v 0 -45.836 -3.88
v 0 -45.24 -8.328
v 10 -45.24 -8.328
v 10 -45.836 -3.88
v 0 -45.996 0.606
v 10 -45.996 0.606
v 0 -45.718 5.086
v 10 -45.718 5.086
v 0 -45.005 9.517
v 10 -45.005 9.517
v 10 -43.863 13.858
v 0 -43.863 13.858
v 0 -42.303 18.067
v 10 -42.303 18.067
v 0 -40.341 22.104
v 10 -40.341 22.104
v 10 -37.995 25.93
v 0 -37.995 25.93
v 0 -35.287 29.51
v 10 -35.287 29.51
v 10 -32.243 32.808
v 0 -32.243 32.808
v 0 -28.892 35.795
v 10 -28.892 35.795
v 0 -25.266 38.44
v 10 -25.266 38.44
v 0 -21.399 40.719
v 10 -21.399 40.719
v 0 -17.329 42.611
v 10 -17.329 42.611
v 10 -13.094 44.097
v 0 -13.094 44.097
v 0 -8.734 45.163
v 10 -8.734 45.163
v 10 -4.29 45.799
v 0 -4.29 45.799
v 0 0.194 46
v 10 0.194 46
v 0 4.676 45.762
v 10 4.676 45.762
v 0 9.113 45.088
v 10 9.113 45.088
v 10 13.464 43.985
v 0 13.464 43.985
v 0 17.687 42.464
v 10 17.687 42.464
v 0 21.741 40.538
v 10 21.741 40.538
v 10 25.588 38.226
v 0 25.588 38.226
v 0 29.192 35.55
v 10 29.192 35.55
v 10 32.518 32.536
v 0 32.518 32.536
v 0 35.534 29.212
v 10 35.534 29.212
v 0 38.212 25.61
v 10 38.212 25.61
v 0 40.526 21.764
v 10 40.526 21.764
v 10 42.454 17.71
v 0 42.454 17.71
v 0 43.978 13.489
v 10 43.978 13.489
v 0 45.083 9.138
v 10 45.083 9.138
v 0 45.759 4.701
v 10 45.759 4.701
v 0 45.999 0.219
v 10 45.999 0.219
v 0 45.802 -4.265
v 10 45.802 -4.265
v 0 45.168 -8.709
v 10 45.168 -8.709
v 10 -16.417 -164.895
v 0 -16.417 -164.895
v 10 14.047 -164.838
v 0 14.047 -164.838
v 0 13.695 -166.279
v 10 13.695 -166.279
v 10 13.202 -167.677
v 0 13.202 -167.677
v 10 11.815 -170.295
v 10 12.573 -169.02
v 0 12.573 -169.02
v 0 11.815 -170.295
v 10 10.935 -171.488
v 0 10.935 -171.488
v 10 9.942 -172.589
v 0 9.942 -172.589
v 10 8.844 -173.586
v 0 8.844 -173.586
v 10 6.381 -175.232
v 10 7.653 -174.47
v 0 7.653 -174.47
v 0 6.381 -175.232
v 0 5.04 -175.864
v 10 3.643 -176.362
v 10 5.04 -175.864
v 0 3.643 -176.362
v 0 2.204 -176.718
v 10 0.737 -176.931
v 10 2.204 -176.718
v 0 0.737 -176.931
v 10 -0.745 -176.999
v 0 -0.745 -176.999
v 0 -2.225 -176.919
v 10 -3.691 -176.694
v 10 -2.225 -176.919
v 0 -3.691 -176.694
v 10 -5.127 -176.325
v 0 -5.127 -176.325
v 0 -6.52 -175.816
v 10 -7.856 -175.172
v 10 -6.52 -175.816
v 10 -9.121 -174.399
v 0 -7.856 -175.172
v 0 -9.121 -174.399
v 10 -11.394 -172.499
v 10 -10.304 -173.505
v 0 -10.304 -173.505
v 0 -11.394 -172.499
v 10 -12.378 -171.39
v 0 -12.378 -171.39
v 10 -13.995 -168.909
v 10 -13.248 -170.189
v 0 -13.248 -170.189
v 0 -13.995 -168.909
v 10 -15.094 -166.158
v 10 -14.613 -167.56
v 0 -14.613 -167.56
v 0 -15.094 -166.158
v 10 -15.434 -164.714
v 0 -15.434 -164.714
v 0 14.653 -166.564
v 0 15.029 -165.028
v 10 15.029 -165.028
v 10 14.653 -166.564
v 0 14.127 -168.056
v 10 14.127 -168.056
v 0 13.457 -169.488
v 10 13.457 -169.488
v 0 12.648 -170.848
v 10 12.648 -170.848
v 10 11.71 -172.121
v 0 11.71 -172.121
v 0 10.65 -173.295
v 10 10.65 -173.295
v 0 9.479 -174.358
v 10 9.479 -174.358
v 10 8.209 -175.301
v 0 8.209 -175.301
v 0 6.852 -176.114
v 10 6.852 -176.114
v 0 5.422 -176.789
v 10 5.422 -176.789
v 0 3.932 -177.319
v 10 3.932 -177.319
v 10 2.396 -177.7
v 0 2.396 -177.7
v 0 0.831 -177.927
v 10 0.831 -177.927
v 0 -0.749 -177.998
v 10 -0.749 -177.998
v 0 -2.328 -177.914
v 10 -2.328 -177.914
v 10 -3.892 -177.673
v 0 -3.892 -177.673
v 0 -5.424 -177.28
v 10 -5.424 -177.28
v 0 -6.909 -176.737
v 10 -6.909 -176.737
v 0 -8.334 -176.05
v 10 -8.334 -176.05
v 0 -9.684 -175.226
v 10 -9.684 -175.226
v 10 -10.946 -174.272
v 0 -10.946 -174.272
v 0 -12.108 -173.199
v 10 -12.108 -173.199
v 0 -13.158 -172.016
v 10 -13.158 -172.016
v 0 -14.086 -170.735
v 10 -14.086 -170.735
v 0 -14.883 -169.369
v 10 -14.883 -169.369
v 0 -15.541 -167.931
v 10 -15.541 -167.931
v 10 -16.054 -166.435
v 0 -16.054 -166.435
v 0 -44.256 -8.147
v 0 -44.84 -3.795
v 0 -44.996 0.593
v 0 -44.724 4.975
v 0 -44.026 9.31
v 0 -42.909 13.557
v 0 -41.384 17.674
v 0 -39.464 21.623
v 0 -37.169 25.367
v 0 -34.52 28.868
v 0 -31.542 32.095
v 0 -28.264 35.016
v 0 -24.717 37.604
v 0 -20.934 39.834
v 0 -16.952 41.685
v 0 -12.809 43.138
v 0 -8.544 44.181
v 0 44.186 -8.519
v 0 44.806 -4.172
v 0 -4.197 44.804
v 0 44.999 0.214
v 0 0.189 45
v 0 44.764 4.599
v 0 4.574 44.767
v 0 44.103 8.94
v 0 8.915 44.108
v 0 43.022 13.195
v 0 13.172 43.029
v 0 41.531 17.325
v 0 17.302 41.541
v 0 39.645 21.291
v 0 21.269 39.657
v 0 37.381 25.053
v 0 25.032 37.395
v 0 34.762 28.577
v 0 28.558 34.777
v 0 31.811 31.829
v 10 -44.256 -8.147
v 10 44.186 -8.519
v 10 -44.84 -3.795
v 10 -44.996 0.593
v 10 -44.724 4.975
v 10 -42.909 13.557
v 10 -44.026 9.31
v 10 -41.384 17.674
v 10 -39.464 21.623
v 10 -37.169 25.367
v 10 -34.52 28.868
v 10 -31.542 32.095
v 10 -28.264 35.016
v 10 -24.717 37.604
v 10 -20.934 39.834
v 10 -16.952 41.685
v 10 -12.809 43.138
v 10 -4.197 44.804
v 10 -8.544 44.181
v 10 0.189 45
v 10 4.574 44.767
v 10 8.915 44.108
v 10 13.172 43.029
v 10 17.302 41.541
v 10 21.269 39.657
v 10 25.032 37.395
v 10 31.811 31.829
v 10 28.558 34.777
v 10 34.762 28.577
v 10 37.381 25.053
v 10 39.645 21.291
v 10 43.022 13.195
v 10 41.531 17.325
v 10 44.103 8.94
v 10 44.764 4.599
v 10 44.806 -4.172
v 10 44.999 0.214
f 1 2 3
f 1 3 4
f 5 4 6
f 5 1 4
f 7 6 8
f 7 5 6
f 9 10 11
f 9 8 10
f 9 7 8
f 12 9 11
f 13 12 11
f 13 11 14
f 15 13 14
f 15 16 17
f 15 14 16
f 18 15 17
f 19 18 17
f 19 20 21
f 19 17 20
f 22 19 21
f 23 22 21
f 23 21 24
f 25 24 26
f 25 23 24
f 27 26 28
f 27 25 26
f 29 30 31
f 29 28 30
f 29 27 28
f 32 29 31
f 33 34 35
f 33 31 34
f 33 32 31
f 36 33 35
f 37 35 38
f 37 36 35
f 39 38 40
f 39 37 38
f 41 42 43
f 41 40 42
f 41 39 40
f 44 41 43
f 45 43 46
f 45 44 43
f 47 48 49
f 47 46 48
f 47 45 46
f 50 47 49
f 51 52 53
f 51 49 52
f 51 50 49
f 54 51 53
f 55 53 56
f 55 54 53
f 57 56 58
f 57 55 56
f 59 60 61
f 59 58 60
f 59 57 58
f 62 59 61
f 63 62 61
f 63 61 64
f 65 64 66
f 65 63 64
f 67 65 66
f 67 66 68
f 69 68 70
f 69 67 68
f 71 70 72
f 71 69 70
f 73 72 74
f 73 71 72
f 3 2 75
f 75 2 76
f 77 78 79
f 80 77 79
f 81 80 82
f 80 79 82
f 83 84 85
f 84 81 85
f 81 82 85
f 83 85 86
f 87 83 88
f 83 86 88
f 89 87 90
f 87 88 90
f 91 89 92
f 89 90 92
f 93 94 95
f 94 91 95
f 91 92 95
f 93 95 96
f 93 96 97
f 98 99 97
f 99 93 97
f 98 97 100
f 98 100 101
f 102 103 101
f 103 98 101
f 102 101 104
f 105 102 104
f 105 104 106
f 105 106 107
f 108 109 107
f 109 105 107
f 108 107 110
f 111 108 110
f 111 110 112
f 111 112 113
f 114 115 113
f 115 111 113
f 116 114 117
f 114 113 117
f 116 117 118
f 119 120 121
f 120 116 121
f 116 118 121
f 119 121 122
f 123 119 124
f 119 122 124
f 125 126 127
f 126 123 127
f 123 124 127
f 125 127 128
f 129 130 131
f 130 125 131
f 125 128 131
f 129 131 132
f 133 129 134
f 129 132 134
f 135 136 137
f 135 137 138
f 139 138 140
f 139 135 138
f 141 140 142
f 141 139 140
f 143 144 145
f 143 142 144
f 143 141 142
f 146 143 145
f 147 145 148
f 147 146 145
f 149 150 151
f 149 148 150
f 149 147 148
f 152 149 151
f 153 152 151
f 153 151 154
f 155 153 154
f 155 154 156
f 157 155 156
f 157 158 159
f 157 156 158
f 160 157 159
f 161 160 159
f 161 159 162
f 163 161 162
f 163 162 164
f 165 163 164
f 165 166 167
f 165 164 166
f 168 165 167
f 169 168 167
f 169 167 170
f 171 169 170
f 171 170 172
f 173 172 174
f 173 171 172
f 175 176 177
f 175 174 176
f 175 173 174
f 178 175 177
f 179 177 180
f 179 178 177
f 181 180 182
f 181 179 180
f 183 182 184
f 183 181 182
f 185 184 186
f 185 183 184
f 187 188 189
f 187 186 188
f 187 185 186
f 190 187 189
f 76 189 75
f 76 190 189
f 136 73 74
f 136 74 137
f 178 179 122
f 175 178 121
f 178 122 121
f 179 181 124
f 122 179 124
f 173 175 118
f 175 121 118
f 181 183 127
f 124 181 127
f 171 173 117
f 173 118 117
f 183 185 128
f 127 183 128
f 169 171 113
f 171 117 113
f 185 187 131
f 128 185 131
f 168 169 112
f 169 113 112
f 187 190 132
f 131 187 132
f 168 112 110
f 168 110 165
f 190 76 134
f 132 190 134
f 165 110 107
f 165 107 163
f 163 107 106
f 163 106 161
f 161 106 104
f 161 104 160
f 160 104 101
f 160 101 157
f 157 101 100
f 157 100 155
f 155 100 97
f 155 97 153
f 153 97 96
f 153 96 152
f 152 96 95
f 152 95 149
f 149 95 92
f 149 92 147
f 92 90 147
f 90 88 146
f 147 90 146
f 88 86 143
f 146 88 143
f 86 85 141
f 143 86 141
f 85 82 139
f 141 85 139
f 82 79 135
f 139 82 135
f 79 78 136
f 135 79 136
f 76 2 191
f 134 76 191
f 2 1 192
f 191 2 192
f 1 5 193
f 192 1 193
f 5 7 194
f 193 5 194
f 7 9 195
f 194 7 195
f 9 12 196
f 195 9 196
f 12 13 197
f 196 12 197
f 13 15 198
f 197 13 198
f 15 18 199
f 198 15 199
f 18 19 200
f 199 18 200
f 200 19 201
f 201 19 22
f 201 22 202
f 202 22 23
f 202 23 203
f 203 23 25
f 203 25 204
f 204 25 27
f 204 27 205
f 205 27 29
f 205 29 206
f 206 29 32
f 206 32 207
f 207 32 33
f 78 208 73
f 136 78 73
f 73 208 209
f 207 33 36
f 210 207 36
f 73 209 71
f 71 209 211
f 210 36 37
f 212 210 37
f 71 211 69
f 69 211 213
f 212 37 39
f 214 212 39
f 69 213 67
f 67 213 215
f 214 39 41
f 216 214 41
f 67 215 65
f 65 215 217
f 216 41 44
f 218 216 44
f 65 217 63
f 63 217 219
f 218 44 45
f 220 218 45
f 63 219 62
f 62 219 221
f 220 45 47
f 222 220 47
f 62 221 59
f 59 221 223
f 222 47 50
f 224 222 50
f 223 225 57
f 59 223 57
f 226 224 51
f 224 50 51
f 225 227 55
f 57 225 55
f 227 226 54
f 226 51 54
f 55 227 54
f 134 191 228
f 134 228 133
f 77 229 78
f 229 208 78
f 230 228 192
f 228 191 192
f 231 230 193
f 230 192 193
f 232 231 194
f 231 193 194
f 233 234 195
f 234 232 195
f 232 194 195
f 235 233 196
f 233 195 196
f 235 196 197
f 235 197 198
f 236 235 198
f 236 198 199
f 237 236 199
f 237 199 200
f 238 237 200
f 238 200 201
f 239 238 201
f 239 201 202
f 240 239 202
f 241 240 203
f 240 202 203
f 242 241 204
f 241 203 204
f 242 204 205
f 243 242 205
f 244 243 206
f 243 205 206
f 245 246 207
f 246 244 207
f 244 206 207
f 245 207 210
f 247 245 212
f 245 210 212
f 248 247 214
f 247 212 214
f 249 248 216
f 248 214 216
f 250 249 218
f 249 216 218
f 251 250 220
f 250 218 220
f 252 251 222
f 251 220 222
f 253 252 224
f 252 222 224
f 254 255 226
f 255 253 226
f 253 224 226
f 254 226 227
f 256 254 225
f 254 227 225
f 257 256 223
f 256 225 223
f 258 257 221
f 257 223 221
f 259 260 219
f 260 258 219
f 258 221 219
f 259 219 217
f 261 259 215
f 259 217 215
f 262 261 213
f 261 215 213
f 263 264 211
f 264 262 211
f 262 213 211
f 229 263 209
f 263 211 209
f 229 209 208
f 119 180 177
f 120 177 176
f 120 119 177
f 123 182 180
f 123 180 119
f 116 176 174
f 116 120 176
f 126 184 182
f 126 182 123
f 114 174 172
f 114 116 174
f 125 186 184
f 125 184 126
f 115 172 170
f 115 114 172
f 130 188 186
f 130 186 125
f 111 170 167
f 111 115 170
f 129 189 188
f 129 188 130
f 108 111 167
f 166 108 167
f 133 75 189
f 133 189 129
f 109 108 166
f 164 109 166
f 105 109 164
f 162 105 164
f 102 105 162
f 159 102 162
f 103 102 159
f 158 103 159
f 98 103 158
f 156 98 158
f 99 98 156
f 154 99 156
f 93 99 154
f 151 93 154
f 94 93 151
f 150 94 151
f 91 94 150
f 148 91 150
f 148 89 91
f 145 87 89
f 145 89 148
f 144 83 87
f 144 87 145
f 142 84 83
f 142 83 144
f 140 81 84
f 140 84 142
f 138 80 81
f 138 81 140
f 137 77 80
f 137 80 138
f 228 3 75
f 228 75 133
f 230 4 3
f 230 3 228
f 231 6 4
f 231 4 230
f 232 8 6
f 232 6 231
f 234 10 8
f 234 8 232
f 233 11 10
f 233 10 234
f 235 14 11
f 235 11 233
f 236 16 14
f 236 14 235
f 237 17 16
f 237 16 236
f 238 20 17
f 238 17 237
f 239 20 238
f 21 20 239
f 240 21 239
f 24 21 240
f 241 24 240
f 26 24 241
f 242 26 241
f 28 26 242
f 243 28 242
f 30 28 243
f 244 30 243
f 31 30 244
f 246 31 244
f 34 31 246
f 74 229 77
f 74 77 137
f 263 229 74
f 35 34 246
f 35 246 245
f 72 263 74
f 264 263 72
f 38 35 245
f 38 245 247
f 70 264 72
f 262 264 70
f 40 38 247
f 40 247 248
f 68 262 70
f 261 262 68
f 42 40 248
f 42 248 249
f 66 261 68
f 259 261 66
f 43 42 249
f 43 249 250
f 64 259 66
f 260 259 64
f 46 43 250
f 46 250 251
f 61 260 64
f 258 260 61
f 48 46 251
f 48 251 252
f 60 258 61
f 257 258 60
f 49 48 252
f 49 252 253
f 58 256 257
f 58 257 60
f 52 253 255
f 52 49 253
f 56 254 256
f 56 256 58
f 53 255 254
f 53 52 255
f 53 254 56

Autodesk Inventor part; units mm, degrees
ref_plane "YZ Plane" through (0, 0, 0) normal (1, 0, 0) x (0, 1, 0)
ref_plane "XZ Plane" through (0, 0, 0) normal (0, 1, 0) x (-1, 0, 0)
ref_plane "XY Plane" through (0, 0, 0) normal (0, 0, 1) x (1, 0, 0)
sketch "スケッチ1" plane through (0, 0, 0) normal (1, 0, 0) x (0, 1, 0)
  arc A0 (45.1681, -8.7086) -> (-45.2398, -8.3282) centre (0, 0) ccw
  arc A1 (-16.4172, -164.8953) -> (15.029, -165.0277) centre (-0.6816, -161.9986) ccw
  line L0 (45.1681, -8.7086) -> (15.029, -165.0277)
  line L1 (-45.2398, -8.3282) -> (-16.4172, -164.8953)
  arc A2 (44.1862, -8.5193) -> (-44.2563, -8.1472) centre (0, 0) ccw
  arc A3 (-15.4338, -164.7143) -> (14.0471, -164.8383) centre (-0.6816, -161.9986) ccw
  line L2 (44.1862, -8.5193) -> (14.0471, -164.8383)
  line L3 (-44.2563, -8.1472) -> (-15.4338, -164.7143)
  dimension "d0" = 92
  dimension "d1" = 32
  dimension "d2" = 100
  dimension "d3" = 90
  dimension "d4" = 30
extrude "押し出し1" add sketch "スケッチ1" along normal blind 10
properties part number "type4" material "ゴム"
